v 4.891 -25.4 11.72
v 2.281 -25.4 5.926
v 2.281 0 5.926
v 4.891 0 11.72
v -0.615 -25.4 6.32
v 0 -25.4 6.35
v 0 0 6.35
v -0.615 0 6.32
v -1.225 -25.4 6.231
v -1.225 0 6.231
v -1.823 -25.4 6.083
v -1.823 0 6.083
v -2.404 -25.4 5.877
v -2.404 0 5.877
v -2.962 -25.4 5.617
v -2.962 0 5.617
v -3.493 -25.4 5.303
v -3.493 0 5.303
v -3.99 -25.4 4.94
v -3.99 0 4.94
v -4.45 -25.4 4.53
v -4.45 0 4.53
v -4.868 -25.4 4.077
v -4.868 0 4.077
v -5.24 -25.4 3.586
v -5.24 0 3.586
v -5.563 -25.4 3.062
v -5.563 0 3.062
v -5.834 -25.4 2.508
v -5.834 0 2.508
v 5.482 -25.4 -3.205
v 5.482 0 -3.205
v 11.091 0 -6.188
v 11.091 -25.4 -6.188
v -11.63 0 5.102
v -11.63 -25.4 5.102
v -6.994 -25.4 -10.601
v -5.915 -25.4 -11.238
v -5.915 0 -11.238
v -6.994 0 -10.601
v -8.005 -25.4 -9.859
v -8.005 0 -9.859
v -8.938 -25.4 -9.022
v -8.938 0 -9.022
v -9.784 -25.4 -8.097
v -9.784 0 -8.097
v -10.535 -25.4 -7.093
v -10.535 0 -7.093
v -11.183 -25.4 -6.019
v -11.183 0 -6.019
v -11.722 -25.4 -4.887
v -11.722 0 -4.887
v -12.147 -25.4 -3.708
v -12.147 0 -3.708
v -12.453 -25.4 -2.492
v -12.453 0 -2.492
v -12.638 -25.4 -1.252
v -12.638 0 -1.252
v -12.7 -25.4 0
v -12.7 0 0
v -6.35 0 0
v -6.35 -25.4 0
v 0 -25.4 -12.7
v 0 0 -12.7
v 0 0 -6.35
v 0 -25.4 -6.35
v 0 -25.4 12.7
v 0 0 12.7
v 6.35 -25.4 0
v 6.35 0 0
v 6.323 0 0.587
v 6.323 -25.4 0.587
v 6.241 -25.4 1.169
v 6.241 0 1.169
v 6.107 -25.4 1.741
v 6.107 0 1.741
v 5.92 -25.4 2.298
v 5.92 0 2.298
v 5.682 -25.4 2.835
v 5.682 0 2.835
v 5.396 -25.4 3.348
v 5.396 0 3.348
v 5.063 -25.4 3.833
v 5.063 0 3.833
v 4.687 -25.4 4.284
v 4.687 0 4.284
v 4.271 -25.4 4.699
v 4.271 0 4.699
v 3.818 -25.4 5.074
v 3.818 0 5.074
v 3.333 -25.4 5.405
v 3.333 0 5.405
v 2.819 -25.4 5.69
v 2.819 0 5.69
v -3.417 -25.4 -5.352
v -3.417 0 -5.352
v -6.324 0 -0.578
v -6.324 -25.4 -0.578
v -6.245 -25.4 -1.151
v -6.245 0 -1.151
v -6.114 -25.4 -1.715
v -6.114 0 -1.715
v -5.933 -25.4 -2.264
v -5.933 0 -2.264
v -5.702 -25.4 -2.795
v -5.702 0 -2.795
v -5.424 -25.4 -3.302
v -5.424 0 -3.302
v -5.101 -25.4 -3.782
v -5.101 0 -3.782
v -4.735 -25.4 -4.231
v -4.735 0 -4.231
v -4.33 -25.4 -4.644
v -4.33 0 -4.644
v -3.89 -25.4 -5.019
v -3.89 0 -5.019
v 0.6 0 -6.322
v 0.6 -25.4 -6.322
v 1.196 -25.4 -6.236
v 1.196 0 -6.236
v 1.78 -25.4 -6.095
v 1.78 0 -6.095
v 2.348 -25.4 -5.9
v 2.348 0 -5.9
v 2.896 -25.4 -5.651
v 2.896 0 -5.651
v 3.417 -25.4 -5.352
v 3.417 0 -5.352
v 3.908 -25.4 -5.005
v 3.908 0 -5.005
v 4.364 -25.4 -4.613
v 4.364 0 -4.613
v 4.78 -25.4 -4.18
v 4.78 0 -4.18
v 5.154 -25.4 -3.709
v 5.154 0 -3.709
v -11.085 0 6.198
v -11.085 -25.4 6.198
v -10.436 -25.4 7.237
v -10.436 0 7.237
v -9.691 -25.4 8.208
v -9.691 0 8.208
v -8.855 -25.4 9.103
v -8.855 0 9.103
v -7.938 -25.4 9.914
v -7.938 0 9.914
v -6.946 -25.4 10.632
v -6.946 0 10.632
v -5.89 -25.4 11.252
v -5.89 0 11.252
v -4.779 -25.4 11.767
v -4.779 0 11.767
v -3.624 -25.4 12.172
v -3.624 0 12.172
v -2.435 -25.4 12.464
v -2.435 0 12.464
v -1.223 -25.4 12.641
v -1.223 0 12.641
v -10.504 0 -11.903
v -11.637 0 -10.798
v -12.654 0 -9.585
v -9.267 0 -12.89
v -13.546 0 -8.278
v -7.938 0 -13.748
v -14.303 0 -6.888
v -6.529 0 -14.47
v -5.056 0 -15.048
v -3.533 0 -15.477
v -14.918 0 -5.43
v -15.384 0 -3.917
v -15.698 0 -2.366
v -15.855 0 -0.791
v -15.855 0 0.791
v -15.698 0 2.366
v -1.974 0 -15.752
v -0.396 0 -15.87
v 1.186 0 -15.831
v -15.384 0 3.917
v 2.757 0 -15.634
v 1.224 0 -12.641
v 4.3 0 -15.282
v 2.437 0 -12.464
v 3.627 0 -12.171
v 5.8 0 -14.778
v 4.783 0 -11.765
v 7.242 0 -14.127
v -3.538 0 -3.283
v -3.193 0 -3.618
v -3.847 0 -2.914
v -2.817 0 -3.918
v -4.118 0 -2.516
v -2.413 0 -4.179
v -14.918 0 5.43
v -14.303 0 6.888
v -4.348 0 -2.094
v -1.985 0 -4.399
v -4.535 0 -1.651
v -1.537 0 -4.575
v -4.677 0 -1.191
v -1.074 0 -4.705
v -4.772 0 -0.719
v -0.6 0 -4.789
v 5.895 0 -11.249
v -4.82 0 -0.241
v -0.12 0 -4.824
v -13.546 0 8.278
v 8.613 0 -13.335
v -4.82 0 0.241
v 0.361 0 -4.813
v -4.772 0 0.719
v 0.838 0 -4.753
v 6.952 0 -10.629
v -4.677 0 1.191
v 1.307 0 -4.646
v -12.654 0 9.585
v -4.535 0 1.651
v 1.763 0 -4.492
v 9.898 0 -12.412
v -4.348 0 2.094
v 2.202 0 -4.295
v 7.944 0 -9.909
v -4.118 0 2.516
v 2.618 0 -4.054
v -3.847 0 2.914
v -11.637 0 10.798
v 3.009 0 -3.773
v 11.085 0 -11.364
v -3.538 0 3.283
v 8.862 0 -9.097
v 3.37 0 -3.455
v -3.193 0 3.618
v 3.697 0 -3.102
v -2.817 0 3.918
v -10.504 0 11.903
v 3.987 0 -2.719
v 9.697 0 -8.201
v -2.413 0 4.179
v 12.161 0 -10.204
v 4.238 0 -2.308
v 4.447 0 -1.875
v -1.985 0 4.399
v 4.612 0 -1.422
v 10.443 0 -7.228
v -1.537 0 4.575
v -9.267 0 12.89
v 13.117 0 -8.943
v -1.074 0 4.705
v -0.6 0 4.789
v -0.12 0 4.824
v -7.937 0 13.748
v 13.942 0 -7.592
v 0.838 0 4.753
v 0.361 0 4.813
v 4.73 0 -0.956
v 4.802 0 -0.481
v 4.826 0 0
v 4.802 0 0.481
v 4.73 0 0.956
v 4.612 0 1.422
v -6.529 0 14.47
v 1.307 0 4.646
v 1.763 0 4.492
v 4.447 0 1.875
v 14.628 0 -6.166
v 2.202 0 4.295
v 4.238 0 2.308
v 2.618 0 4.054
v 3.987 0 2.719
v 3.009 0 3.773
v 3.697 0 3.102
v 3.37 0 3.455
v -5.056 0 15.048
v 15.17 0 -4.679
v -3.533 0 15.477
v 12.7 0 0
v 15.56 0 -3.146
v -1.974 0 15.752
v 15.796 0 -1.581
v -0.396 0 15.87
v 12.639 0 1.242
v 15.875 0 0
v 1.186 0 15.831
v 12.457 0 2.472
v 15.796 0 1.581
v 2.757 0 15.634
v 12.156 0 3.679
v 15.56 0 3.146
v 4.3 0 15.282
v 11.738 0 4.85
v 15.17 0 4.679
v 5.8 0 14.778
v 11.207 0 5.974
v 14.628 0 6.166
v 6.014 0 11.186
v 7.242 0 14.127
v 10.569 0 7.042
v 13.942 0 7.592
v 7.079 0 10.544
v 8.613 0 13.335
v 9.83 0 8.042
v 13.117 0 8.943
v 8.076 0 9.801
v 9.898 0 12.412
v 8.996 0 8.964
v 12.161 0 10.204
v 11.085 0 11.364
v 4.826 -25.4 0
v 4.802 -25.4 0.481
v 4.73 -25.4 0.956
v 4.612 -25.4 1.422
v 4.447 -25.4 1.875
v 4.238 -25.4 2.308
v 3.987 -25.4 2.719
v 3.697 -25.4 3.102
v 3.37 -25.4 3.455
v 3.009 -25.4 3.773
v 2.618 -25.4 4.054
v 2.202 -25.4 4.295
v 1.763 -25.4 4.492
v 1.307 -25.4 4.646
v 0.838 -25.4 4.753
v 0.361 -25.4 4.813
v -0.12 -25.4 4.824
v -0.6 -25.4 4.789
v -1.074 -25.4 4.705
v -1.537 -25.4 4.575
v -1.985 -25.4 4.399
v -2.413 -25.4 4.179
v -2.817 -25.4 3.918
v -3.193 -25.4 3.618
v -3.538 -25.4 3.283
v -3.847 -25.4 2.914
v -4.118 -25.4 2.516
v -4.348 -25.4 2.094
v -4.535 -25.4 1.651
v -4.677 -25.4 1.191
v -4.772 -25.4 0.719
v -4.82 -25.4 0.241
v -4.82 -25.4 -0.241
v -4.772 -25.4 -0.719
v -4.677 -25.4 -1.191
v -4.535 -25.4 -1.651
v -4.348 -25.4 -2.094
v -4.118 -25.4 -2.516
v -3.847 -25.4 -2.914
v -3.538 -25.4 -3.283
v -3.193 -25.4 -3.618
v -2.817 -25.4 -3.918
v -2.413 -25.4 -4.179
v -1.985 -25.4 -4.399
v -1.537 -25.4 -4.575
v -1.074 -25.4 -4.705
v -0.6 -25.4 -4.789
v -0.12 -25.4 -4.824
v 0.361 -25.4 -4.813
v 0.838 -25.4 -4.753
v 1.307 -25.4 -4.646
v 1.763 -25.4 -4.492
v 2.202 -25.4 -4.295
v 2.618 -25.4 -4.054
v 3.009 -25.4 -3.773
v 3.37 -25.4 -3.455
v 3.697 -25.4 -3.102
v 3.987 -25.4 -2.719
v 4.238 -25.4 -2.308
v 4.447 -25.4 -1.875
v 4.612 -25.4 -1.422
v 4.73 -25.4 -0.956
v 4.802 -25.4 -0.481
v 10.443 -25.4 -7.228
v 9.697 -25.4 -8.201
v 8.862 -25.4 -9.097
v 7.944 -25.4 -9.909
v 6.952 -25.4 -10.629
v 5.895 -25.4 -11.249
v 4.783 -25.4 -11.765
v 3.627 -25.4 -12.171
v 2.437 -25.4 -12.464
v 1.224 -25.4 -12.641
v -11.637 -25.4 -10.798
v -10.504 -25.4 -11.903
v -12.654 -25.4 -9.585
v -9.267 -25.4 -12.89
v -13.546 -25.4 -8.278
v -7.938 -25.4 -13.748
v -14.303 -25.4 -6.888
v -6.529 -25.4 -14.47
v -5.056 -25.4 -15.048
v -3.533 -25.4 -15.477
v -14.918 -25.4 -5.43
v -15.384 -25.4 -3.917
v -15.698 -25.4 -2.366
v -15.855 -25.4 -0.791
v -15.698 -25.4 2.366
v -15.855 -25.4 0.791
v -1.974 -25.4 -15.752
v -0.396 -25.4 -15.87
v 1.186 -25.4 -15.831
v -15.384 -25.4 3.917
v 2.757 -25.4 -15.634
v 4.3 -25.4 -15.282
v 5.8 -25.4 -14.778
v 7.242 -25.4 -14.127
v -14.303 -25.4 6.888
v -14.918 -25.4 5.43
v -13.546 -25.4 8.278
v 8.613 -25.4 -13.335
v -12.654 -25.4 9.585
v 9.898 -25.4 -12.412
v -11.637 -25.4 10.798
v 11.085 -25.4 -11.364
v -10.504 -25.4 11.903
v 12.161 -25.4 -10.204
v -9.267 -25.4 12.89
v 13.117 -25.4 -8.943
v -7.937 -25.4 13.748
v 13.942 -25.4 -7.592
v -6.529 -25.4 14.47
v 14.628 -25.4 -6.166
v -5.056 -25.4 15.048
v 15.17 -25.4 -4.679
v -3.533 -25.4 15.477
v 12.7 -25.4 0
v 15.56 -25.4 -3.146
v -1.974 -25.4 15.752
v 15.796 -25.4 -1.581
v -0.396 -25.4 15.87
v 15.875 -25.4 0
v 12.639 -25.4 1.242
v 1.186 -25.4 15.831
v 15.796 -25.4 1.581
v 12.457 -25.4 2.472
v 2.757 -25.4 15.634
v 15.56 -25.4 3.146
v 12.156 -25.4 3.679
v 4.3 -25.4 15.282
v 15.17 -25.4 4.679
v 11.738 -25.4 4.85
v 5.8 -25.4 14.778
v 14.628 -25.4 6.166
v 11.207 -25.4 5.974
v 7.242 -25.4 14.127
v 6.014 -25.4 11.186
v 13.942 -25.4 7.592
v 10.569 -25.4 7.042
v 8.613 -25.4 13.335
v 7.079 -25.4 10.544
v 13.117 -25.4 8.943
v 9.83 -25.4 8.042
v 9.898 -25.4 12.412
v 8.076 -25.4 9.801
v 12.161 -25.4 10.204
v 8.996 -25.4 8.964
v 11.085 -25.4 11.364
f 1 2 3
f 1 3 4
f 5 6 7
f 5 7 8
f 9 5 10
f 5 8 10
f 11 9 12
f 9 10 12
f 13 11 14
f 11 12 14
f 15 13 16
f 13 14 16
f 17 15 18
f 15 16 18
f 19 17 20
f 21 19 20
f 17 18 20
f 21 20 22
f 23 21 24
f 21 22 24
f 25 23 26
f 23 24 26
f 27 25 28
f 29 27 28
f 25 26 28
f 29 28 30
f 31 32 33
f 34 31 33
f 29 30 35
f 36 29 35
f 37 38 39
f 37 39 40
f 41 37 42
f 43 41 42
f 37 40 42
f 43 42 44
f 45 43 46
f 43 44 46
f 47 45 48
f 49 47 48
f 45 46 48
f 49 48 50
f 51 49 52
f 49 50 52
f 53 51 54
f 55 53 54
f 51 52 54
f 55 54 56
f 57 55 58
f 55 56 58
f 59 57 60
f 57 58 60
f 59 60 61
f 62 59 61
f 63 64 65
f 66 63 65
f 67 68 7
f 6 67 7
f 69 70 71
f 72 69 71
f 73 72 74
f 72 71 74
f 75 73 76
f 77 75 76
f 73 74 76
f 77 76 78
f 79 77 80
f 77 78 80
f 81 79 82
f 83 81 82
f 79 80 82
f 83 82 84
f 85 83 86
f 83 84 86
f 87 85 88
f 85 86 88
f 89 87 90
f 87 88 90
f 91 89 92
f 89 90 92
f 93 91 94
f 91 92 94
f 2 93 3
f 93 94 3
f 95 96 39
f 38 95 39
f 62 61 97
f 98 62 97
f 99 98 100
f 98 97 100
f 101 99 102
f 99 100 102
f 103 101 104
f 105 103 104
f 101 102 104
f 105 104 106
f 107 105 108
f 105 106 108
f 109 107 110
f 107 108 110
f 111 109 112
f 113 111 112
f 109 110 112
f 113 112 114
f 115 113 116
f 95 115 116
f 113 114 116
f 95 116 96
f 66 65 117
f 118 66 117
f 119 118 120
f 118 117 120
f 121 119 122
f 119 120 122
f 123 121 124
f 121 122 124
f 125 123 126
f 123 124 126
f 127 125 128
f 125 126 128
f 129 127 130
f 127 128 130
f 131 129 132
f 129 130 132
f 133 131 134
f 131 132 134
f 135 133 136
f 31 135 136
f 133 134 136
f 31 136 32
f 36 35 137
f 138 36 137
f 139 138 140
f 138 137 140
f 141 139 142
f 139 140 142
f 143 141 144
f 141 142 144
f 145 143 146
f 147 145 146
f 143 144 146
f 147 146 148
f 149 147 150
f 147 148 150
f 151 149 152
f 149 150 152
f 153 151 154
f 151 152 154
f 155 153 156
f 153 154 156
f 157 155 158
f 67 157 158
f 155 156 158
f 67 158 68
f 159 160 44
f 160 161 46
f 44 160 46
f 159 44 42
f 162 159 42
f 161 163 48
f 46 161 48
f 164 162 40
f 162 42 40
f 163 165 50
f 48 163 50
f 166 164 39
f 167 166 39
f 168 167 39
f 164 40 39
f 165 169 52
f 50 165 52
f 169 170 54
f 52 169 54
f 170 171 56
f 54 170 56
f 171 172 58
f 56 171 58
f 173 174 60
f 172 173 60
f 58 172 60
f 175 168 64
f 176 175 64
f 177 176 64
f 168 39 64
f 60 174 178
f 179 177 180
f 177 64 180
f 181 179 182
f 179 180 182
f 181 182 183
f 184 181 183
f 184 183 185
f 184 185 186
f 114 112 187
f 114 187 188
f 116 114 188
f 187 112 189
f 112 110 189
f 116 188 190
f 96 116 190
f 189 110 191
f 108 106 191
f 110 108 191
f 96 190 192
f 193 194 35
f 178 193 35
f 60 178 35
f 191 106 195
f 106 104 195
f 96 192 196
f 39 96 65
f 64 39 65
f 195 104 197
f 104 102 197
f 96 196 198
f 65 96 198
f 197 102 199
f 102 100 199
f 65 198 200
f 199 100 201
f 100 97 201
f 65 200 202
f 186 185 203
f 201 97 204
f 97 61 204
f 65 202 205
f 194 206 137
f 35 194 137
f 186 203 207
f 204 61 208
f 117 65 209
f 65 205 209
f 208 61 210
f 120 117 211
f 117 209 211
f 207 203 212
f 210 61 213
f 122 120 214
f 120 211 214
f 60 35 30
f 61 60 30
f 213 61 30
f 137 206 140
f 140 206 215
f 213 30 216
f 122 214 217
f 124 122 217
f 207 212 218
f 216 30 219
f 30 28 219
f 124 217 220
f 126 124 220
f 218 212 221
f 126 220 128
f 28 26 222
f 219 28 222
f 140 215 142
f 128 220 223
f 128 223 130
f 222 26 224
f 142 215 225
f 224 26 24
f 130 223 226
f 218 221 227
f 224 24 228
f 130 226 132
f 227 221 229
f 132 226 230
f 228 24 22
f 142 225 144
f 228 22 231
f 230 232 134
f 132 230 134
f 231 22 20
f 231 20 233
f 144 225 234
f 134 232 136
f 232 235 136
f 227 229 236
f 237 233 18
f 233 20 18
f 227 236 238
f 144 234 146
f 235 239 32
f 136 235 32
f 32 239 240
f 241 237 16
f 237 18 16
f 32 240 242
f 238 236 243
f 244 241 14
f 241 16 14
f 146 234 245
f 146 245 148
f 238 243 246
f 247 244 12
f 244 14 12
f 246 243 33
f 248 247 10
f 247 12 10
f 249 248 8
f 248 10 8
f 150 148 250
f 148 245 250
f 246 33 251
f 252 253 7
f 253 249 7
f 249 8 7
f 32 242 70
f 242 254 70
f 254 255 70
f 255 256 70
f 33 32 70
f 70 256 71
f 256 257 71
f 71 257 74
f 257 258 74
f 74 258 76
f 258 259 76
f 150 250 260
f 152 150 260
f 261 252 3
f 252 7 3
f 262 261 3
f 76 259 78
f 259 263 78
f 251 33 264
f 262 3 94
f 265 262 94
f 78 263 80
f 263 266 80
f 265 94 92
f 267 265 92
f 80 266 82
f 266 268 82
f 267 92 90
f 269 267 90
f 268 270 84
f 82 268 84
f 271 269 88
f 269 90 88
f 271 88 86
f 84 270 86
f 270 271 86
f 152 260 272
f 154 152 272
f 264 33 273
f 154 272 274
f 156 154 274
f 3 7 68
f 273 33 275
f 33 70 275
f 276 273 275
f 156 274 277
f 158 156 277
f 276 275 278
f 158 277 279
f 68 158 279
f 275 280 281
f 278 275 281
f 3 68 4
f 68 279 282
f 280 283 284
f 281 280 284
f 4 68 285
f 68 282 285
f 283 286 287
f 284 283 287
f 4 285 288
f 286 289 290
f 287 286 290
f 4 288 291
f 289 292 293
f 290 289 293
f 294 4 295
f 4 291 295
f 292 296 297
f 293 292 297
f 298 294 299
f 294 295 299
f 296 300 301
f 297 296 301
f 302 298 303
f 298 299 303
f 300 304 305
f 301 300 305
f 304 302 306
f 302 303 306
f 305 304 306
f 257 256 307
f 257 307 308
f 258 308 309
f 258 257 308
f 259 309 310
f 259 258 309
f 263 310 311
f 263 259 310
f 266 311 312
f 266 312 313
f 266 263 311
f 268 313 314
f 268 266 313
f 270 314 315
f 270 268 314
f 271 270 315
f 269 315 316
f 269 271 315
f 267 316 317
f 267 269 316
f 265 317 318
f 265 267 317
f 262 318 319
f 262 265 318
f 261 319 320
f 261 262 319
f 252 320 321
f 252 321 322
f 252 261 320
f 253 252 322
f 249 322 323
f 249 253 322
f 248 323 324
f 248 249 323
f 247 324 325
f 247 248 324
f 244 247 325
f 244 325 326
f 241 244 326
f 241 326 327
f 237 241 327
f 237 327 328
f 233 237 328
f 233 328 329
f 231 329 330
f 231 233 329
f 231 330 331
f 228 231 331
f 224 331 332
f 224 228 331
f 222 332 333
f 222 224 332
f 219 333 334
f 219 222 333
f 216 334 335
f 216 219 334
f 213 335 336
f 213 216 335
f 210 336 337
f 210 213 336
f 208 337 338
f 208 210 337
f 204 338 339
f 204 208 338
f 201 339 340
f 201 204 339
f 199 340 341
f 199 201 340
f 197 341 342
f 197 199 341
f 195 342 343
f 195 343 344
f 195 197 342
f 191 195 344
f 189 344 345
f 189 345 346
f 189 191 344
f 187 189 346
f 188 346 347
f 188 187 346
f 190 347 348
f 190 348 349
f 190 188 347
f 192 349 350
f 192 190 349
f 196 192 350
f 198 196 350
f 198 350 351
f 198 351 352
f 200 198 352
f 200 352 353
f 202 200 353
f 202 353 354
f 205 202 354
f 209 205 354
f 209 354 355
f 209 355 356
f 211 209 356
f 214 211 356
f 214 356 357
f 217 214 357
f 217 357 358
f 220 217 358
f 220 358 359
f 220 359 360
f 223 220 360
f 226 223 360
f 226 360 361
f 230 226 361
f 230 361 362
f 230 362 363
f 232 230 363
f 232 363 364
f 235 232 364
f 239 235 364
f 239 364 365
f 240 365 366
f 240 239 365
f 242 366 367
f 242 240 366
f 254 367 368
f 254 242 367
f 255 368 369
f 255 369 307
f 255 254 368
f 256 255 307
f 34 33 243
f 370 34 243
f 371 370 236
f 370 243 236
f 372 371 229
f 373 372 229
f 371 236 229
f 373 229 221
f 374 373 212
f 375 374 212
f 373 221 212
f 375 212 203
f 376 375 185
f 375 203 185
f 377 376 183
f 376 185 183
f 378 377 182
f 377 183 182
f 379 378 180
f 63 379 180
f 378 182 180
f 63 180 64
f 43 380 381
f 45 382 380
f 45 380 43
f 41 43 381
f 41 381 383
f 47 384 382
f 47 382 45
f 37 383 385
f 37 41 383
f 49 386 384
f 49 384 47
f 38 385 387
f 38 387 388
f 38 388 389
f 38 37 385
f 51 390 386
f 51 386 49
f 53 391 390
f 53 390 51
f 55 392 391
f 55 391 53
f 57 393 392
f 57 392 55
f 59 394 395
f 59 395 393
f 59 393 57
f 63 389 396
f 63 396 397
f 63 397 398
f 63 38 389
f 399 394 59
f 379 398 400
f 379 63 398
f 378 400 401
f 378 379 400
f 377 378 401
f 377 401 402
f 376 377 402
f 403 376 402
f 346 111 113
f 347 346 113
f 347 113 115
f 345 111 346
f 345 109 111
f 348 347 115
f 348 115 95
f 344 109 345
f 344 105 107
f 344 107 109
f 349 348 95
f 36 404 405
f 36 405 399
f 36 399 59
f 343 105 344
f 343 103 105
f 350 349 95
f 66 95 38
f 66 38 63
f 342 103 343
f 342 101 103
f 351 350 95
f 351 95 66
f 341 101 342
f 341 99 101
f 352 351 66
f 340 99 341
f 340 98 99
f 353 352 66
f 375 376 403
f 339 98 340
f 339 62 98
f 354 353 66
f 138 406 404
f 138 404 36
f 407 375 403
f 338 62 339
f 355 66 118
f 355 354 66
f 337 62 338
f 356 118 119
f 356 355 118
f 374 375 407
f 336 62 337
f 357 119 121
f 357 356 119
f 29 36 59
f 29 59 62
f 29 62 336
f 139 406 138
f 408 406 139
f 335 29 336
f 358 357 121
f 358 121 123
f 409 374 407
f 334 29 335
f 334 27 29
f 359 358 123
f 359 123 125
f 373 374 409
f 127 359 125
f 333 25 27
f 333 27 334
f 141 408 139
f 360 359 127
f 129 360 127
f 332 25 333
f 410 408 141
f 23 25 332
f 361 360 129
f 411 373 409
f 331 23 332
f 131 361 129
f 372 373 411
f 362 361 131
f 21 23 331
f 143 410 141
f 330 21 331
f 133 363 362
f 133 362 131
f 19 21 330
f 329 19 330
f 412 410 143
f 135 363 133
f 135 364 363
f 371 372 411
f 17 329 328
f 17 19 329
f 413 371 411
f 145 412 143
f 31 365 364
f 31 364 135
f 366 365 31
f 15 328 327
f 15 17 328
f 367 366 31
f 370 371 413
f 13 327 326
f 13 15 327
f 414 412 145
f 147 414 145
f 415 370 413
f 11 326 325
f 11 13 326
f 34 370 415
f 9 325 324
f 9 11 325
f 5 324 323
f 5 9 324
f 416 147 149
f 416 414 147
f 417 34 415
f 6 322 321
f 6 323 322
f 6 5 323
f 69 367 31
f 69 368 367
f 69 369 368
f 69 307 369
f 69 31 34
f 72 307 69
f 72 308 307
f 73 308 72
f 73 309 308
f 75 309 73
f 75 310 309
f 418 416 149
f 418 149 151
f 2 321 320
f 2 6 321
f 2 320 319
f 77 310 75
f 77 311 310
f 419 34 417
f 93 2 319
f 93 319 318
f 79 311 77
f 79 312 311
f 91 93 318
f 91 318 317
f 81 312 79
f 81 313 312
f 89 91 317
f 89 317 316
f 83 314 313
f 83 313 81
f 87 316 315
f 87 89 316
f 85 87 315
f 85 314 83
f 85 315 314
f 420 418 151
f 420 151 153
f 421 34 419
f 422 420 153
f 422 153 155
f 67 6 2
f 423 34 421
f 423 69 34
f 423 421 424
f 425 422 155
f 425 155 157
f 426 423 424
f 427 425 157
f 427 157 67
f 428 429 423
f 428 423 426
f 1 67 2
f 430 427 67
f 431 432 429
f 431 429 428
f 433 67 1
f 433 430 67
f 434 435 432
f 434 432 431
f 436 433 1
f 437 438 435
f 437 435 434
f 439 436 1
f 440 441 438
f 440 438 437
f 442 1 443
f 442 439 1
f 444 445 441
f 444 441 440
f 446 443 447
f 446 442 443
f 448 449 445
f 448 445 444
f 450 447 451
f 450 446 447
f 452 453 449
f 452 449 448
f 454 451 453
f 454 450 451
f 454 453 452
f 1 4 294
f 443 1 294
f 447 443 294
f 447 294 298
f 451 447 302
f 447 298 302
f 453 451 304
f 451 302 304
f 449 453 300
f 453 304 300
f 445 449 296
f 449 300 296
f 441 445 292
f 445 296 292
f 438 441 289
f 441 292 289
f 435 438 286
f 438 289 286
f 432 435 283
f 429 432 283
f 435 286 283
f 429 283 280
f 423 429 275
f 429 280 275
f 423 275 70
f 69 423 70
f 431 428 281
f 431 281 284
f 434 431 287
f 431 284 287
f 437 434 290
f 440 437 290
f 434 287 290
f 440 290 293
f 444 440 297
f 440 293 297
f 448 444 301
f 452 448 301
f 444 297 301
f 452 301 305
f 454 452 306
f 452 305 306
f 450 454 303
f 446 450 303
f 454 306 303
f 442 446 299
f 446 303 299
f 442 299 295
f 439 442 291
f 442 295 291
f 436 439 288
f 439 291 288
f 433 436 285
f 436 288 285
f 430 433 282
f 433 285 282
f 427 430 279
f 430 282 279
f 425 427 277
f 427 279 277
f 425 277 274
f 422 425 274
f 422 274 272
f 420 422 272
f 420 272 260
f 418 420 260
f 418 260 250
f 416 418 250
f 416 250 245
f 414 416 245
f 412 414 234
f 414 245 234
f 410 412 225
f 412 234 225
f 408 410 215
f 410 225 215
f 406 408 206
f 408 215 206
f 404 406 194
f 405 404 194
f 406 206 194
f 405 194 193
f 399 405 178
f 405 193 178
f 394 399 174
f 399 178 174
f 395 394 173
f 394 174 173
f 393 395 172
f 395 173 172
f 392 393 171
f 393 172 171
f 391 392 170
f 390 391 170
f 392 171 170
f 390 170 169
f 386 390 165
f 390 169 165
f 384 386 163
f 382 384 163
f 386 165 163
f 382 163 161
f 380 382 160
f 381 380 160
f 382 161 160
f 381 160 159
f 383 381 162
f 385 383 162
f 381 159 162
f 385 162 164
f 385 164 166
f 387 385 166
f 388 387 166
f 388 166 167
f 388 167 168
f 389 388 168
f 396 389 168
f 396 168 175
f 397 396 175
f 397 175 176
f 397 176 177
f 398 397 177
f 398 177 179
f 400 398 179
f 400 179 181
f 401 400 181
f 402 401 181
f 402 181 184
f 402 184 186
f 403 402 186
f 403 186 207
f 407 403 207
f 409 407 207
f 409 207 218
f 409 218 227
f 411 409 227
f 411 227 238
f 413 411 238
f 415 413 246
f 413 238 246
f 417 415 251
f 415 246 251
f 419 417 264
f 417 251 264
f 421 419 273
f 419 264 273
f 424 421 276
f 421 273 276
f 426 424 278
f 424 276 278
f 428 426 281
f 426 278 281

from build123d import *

# Parameters (mm, degrees)
F0_R     = 15.875
F0_R_2   = 4.826
F1_DEPTH = 25.4


with BuildPart() as f1:
    # F0 (on Front) → F1 (new body)
    with BuildSketch(Plane.XZ):
        Circle(F0_R)
        with BuildLine():
            ThreePointArc((4.891009, 11.720411), (10.56896, 7.04181), (12.7, 0))
            ThreePointArc((12.7, 0), (12.291071, -3.196806), (11.09062, -6.187743))
            ThreePointArc((11.09062, -6.187743), (6.430617, -10.951583), (0, -12.7))
            ThreePointArc((0, -12.7), (-3.046434, -12.329203), (-5.914977, -11.238463))
            ThreePointArc((-5.914977, -11.238463), (-10.872217, -6.563908), (-12.7, 0))
            ThreePointArc((-12.7, 0), (-12.429648, 2.606501), (-11.630103, 5.10203))
            ThreePointArc((-11.630103, 5.10203), (-6.946014, 10.632163), (0, 12.7))
            ThreePointArc((0, 12.7), (2.494071, 12.452695), (4.891009, 11.720411))
        make_face(mode=Mode.SUBTRACT)
        with BuildLine():
            Line((2.281079, 5.926144), (4.891009, 11.720411))
            ThreePointArc((4.891009, 11.720411), (2.494071, 12.452695), (0, 12.7))
            Line((0, 12.7), (0, 6.35))
            ThreePointArc((0, 6.35), (1.160062, 6.243137), (2.281079, 5.926144))
        make_face()
        with BuildLine():
            Line((-5.833724, 2.508019), (-11.630103, 5.10203))
            ThreePointArc((-11.630103, 5.10203), (-12.429648, 2.606501), (-12.7, 0))
            Line((-12.7, 0), (-6.35, 0))
            ThreePointArc((-6.35, 0), (-6.219592, 1.280303), (-5.833724, 2.508019))
        make_face()
        with BuildLine():
            ThreePointArc((-5.914977, -11.238463), (-3.046434, -12.329203), (0, -12.7))
            Line((0, -12.7), (0, -6.35))
            ThreePointArc((0, -6.35), (-1.77968, -6.09551), (-3.416711, -5.352437))
            Line((-3.416711, -5.352437), (-5.914977, -11.238463))
        make_face()
        with BuildLine():
            ThreePointArc((11.09062, -6.187743), (12.291071, -3.196806), (12.7, 0))
            Line((12.7, 0), (6.35, 0))
            ThreePointArc((6.35, 0), (6.129141, -1.660162), (5.481926, -3.204839))
            Line((5.481926, -3.204839), (11.09062, -6.187743))
        make_face()
        with BuildLine():
            ThreePointArc((5.481926, -3.204839), (6.129141, -1.660162), (6.35, 0))
            ThreePointArc((6.35, 0), (5.234852, 3.594276), (2.281079, 5.926144))
            ThreePointArc((2.281079, 5.926144), (1.160062, 6.243137), (0, 6.35))
            ThreePointArc((0, 6.35), (-3.492605, 5.303226), (-5.833724, 2.508019))
            ThreePointArc((-5.833724, 2.508019), (-6.219592, 1.280303), (-6.35, 0))
            ThreePointArc((-6.35, 0), (-5.5686, -3.051752), (-3.416711, -5.352437))
            ThreePointArc((-3.416711, -5.352437), (-1.77968, -6.09551), (0, -6.35))
            ThreePointArc((0, -6.35), (3.160045, -5.507868), (5.481926, -3.204839))
        make_face()
        Circle(F0_R_2, mode=Mode.SUBTRACT)
    extrude(amount=F1_DEPTH)


solid = f1.part
